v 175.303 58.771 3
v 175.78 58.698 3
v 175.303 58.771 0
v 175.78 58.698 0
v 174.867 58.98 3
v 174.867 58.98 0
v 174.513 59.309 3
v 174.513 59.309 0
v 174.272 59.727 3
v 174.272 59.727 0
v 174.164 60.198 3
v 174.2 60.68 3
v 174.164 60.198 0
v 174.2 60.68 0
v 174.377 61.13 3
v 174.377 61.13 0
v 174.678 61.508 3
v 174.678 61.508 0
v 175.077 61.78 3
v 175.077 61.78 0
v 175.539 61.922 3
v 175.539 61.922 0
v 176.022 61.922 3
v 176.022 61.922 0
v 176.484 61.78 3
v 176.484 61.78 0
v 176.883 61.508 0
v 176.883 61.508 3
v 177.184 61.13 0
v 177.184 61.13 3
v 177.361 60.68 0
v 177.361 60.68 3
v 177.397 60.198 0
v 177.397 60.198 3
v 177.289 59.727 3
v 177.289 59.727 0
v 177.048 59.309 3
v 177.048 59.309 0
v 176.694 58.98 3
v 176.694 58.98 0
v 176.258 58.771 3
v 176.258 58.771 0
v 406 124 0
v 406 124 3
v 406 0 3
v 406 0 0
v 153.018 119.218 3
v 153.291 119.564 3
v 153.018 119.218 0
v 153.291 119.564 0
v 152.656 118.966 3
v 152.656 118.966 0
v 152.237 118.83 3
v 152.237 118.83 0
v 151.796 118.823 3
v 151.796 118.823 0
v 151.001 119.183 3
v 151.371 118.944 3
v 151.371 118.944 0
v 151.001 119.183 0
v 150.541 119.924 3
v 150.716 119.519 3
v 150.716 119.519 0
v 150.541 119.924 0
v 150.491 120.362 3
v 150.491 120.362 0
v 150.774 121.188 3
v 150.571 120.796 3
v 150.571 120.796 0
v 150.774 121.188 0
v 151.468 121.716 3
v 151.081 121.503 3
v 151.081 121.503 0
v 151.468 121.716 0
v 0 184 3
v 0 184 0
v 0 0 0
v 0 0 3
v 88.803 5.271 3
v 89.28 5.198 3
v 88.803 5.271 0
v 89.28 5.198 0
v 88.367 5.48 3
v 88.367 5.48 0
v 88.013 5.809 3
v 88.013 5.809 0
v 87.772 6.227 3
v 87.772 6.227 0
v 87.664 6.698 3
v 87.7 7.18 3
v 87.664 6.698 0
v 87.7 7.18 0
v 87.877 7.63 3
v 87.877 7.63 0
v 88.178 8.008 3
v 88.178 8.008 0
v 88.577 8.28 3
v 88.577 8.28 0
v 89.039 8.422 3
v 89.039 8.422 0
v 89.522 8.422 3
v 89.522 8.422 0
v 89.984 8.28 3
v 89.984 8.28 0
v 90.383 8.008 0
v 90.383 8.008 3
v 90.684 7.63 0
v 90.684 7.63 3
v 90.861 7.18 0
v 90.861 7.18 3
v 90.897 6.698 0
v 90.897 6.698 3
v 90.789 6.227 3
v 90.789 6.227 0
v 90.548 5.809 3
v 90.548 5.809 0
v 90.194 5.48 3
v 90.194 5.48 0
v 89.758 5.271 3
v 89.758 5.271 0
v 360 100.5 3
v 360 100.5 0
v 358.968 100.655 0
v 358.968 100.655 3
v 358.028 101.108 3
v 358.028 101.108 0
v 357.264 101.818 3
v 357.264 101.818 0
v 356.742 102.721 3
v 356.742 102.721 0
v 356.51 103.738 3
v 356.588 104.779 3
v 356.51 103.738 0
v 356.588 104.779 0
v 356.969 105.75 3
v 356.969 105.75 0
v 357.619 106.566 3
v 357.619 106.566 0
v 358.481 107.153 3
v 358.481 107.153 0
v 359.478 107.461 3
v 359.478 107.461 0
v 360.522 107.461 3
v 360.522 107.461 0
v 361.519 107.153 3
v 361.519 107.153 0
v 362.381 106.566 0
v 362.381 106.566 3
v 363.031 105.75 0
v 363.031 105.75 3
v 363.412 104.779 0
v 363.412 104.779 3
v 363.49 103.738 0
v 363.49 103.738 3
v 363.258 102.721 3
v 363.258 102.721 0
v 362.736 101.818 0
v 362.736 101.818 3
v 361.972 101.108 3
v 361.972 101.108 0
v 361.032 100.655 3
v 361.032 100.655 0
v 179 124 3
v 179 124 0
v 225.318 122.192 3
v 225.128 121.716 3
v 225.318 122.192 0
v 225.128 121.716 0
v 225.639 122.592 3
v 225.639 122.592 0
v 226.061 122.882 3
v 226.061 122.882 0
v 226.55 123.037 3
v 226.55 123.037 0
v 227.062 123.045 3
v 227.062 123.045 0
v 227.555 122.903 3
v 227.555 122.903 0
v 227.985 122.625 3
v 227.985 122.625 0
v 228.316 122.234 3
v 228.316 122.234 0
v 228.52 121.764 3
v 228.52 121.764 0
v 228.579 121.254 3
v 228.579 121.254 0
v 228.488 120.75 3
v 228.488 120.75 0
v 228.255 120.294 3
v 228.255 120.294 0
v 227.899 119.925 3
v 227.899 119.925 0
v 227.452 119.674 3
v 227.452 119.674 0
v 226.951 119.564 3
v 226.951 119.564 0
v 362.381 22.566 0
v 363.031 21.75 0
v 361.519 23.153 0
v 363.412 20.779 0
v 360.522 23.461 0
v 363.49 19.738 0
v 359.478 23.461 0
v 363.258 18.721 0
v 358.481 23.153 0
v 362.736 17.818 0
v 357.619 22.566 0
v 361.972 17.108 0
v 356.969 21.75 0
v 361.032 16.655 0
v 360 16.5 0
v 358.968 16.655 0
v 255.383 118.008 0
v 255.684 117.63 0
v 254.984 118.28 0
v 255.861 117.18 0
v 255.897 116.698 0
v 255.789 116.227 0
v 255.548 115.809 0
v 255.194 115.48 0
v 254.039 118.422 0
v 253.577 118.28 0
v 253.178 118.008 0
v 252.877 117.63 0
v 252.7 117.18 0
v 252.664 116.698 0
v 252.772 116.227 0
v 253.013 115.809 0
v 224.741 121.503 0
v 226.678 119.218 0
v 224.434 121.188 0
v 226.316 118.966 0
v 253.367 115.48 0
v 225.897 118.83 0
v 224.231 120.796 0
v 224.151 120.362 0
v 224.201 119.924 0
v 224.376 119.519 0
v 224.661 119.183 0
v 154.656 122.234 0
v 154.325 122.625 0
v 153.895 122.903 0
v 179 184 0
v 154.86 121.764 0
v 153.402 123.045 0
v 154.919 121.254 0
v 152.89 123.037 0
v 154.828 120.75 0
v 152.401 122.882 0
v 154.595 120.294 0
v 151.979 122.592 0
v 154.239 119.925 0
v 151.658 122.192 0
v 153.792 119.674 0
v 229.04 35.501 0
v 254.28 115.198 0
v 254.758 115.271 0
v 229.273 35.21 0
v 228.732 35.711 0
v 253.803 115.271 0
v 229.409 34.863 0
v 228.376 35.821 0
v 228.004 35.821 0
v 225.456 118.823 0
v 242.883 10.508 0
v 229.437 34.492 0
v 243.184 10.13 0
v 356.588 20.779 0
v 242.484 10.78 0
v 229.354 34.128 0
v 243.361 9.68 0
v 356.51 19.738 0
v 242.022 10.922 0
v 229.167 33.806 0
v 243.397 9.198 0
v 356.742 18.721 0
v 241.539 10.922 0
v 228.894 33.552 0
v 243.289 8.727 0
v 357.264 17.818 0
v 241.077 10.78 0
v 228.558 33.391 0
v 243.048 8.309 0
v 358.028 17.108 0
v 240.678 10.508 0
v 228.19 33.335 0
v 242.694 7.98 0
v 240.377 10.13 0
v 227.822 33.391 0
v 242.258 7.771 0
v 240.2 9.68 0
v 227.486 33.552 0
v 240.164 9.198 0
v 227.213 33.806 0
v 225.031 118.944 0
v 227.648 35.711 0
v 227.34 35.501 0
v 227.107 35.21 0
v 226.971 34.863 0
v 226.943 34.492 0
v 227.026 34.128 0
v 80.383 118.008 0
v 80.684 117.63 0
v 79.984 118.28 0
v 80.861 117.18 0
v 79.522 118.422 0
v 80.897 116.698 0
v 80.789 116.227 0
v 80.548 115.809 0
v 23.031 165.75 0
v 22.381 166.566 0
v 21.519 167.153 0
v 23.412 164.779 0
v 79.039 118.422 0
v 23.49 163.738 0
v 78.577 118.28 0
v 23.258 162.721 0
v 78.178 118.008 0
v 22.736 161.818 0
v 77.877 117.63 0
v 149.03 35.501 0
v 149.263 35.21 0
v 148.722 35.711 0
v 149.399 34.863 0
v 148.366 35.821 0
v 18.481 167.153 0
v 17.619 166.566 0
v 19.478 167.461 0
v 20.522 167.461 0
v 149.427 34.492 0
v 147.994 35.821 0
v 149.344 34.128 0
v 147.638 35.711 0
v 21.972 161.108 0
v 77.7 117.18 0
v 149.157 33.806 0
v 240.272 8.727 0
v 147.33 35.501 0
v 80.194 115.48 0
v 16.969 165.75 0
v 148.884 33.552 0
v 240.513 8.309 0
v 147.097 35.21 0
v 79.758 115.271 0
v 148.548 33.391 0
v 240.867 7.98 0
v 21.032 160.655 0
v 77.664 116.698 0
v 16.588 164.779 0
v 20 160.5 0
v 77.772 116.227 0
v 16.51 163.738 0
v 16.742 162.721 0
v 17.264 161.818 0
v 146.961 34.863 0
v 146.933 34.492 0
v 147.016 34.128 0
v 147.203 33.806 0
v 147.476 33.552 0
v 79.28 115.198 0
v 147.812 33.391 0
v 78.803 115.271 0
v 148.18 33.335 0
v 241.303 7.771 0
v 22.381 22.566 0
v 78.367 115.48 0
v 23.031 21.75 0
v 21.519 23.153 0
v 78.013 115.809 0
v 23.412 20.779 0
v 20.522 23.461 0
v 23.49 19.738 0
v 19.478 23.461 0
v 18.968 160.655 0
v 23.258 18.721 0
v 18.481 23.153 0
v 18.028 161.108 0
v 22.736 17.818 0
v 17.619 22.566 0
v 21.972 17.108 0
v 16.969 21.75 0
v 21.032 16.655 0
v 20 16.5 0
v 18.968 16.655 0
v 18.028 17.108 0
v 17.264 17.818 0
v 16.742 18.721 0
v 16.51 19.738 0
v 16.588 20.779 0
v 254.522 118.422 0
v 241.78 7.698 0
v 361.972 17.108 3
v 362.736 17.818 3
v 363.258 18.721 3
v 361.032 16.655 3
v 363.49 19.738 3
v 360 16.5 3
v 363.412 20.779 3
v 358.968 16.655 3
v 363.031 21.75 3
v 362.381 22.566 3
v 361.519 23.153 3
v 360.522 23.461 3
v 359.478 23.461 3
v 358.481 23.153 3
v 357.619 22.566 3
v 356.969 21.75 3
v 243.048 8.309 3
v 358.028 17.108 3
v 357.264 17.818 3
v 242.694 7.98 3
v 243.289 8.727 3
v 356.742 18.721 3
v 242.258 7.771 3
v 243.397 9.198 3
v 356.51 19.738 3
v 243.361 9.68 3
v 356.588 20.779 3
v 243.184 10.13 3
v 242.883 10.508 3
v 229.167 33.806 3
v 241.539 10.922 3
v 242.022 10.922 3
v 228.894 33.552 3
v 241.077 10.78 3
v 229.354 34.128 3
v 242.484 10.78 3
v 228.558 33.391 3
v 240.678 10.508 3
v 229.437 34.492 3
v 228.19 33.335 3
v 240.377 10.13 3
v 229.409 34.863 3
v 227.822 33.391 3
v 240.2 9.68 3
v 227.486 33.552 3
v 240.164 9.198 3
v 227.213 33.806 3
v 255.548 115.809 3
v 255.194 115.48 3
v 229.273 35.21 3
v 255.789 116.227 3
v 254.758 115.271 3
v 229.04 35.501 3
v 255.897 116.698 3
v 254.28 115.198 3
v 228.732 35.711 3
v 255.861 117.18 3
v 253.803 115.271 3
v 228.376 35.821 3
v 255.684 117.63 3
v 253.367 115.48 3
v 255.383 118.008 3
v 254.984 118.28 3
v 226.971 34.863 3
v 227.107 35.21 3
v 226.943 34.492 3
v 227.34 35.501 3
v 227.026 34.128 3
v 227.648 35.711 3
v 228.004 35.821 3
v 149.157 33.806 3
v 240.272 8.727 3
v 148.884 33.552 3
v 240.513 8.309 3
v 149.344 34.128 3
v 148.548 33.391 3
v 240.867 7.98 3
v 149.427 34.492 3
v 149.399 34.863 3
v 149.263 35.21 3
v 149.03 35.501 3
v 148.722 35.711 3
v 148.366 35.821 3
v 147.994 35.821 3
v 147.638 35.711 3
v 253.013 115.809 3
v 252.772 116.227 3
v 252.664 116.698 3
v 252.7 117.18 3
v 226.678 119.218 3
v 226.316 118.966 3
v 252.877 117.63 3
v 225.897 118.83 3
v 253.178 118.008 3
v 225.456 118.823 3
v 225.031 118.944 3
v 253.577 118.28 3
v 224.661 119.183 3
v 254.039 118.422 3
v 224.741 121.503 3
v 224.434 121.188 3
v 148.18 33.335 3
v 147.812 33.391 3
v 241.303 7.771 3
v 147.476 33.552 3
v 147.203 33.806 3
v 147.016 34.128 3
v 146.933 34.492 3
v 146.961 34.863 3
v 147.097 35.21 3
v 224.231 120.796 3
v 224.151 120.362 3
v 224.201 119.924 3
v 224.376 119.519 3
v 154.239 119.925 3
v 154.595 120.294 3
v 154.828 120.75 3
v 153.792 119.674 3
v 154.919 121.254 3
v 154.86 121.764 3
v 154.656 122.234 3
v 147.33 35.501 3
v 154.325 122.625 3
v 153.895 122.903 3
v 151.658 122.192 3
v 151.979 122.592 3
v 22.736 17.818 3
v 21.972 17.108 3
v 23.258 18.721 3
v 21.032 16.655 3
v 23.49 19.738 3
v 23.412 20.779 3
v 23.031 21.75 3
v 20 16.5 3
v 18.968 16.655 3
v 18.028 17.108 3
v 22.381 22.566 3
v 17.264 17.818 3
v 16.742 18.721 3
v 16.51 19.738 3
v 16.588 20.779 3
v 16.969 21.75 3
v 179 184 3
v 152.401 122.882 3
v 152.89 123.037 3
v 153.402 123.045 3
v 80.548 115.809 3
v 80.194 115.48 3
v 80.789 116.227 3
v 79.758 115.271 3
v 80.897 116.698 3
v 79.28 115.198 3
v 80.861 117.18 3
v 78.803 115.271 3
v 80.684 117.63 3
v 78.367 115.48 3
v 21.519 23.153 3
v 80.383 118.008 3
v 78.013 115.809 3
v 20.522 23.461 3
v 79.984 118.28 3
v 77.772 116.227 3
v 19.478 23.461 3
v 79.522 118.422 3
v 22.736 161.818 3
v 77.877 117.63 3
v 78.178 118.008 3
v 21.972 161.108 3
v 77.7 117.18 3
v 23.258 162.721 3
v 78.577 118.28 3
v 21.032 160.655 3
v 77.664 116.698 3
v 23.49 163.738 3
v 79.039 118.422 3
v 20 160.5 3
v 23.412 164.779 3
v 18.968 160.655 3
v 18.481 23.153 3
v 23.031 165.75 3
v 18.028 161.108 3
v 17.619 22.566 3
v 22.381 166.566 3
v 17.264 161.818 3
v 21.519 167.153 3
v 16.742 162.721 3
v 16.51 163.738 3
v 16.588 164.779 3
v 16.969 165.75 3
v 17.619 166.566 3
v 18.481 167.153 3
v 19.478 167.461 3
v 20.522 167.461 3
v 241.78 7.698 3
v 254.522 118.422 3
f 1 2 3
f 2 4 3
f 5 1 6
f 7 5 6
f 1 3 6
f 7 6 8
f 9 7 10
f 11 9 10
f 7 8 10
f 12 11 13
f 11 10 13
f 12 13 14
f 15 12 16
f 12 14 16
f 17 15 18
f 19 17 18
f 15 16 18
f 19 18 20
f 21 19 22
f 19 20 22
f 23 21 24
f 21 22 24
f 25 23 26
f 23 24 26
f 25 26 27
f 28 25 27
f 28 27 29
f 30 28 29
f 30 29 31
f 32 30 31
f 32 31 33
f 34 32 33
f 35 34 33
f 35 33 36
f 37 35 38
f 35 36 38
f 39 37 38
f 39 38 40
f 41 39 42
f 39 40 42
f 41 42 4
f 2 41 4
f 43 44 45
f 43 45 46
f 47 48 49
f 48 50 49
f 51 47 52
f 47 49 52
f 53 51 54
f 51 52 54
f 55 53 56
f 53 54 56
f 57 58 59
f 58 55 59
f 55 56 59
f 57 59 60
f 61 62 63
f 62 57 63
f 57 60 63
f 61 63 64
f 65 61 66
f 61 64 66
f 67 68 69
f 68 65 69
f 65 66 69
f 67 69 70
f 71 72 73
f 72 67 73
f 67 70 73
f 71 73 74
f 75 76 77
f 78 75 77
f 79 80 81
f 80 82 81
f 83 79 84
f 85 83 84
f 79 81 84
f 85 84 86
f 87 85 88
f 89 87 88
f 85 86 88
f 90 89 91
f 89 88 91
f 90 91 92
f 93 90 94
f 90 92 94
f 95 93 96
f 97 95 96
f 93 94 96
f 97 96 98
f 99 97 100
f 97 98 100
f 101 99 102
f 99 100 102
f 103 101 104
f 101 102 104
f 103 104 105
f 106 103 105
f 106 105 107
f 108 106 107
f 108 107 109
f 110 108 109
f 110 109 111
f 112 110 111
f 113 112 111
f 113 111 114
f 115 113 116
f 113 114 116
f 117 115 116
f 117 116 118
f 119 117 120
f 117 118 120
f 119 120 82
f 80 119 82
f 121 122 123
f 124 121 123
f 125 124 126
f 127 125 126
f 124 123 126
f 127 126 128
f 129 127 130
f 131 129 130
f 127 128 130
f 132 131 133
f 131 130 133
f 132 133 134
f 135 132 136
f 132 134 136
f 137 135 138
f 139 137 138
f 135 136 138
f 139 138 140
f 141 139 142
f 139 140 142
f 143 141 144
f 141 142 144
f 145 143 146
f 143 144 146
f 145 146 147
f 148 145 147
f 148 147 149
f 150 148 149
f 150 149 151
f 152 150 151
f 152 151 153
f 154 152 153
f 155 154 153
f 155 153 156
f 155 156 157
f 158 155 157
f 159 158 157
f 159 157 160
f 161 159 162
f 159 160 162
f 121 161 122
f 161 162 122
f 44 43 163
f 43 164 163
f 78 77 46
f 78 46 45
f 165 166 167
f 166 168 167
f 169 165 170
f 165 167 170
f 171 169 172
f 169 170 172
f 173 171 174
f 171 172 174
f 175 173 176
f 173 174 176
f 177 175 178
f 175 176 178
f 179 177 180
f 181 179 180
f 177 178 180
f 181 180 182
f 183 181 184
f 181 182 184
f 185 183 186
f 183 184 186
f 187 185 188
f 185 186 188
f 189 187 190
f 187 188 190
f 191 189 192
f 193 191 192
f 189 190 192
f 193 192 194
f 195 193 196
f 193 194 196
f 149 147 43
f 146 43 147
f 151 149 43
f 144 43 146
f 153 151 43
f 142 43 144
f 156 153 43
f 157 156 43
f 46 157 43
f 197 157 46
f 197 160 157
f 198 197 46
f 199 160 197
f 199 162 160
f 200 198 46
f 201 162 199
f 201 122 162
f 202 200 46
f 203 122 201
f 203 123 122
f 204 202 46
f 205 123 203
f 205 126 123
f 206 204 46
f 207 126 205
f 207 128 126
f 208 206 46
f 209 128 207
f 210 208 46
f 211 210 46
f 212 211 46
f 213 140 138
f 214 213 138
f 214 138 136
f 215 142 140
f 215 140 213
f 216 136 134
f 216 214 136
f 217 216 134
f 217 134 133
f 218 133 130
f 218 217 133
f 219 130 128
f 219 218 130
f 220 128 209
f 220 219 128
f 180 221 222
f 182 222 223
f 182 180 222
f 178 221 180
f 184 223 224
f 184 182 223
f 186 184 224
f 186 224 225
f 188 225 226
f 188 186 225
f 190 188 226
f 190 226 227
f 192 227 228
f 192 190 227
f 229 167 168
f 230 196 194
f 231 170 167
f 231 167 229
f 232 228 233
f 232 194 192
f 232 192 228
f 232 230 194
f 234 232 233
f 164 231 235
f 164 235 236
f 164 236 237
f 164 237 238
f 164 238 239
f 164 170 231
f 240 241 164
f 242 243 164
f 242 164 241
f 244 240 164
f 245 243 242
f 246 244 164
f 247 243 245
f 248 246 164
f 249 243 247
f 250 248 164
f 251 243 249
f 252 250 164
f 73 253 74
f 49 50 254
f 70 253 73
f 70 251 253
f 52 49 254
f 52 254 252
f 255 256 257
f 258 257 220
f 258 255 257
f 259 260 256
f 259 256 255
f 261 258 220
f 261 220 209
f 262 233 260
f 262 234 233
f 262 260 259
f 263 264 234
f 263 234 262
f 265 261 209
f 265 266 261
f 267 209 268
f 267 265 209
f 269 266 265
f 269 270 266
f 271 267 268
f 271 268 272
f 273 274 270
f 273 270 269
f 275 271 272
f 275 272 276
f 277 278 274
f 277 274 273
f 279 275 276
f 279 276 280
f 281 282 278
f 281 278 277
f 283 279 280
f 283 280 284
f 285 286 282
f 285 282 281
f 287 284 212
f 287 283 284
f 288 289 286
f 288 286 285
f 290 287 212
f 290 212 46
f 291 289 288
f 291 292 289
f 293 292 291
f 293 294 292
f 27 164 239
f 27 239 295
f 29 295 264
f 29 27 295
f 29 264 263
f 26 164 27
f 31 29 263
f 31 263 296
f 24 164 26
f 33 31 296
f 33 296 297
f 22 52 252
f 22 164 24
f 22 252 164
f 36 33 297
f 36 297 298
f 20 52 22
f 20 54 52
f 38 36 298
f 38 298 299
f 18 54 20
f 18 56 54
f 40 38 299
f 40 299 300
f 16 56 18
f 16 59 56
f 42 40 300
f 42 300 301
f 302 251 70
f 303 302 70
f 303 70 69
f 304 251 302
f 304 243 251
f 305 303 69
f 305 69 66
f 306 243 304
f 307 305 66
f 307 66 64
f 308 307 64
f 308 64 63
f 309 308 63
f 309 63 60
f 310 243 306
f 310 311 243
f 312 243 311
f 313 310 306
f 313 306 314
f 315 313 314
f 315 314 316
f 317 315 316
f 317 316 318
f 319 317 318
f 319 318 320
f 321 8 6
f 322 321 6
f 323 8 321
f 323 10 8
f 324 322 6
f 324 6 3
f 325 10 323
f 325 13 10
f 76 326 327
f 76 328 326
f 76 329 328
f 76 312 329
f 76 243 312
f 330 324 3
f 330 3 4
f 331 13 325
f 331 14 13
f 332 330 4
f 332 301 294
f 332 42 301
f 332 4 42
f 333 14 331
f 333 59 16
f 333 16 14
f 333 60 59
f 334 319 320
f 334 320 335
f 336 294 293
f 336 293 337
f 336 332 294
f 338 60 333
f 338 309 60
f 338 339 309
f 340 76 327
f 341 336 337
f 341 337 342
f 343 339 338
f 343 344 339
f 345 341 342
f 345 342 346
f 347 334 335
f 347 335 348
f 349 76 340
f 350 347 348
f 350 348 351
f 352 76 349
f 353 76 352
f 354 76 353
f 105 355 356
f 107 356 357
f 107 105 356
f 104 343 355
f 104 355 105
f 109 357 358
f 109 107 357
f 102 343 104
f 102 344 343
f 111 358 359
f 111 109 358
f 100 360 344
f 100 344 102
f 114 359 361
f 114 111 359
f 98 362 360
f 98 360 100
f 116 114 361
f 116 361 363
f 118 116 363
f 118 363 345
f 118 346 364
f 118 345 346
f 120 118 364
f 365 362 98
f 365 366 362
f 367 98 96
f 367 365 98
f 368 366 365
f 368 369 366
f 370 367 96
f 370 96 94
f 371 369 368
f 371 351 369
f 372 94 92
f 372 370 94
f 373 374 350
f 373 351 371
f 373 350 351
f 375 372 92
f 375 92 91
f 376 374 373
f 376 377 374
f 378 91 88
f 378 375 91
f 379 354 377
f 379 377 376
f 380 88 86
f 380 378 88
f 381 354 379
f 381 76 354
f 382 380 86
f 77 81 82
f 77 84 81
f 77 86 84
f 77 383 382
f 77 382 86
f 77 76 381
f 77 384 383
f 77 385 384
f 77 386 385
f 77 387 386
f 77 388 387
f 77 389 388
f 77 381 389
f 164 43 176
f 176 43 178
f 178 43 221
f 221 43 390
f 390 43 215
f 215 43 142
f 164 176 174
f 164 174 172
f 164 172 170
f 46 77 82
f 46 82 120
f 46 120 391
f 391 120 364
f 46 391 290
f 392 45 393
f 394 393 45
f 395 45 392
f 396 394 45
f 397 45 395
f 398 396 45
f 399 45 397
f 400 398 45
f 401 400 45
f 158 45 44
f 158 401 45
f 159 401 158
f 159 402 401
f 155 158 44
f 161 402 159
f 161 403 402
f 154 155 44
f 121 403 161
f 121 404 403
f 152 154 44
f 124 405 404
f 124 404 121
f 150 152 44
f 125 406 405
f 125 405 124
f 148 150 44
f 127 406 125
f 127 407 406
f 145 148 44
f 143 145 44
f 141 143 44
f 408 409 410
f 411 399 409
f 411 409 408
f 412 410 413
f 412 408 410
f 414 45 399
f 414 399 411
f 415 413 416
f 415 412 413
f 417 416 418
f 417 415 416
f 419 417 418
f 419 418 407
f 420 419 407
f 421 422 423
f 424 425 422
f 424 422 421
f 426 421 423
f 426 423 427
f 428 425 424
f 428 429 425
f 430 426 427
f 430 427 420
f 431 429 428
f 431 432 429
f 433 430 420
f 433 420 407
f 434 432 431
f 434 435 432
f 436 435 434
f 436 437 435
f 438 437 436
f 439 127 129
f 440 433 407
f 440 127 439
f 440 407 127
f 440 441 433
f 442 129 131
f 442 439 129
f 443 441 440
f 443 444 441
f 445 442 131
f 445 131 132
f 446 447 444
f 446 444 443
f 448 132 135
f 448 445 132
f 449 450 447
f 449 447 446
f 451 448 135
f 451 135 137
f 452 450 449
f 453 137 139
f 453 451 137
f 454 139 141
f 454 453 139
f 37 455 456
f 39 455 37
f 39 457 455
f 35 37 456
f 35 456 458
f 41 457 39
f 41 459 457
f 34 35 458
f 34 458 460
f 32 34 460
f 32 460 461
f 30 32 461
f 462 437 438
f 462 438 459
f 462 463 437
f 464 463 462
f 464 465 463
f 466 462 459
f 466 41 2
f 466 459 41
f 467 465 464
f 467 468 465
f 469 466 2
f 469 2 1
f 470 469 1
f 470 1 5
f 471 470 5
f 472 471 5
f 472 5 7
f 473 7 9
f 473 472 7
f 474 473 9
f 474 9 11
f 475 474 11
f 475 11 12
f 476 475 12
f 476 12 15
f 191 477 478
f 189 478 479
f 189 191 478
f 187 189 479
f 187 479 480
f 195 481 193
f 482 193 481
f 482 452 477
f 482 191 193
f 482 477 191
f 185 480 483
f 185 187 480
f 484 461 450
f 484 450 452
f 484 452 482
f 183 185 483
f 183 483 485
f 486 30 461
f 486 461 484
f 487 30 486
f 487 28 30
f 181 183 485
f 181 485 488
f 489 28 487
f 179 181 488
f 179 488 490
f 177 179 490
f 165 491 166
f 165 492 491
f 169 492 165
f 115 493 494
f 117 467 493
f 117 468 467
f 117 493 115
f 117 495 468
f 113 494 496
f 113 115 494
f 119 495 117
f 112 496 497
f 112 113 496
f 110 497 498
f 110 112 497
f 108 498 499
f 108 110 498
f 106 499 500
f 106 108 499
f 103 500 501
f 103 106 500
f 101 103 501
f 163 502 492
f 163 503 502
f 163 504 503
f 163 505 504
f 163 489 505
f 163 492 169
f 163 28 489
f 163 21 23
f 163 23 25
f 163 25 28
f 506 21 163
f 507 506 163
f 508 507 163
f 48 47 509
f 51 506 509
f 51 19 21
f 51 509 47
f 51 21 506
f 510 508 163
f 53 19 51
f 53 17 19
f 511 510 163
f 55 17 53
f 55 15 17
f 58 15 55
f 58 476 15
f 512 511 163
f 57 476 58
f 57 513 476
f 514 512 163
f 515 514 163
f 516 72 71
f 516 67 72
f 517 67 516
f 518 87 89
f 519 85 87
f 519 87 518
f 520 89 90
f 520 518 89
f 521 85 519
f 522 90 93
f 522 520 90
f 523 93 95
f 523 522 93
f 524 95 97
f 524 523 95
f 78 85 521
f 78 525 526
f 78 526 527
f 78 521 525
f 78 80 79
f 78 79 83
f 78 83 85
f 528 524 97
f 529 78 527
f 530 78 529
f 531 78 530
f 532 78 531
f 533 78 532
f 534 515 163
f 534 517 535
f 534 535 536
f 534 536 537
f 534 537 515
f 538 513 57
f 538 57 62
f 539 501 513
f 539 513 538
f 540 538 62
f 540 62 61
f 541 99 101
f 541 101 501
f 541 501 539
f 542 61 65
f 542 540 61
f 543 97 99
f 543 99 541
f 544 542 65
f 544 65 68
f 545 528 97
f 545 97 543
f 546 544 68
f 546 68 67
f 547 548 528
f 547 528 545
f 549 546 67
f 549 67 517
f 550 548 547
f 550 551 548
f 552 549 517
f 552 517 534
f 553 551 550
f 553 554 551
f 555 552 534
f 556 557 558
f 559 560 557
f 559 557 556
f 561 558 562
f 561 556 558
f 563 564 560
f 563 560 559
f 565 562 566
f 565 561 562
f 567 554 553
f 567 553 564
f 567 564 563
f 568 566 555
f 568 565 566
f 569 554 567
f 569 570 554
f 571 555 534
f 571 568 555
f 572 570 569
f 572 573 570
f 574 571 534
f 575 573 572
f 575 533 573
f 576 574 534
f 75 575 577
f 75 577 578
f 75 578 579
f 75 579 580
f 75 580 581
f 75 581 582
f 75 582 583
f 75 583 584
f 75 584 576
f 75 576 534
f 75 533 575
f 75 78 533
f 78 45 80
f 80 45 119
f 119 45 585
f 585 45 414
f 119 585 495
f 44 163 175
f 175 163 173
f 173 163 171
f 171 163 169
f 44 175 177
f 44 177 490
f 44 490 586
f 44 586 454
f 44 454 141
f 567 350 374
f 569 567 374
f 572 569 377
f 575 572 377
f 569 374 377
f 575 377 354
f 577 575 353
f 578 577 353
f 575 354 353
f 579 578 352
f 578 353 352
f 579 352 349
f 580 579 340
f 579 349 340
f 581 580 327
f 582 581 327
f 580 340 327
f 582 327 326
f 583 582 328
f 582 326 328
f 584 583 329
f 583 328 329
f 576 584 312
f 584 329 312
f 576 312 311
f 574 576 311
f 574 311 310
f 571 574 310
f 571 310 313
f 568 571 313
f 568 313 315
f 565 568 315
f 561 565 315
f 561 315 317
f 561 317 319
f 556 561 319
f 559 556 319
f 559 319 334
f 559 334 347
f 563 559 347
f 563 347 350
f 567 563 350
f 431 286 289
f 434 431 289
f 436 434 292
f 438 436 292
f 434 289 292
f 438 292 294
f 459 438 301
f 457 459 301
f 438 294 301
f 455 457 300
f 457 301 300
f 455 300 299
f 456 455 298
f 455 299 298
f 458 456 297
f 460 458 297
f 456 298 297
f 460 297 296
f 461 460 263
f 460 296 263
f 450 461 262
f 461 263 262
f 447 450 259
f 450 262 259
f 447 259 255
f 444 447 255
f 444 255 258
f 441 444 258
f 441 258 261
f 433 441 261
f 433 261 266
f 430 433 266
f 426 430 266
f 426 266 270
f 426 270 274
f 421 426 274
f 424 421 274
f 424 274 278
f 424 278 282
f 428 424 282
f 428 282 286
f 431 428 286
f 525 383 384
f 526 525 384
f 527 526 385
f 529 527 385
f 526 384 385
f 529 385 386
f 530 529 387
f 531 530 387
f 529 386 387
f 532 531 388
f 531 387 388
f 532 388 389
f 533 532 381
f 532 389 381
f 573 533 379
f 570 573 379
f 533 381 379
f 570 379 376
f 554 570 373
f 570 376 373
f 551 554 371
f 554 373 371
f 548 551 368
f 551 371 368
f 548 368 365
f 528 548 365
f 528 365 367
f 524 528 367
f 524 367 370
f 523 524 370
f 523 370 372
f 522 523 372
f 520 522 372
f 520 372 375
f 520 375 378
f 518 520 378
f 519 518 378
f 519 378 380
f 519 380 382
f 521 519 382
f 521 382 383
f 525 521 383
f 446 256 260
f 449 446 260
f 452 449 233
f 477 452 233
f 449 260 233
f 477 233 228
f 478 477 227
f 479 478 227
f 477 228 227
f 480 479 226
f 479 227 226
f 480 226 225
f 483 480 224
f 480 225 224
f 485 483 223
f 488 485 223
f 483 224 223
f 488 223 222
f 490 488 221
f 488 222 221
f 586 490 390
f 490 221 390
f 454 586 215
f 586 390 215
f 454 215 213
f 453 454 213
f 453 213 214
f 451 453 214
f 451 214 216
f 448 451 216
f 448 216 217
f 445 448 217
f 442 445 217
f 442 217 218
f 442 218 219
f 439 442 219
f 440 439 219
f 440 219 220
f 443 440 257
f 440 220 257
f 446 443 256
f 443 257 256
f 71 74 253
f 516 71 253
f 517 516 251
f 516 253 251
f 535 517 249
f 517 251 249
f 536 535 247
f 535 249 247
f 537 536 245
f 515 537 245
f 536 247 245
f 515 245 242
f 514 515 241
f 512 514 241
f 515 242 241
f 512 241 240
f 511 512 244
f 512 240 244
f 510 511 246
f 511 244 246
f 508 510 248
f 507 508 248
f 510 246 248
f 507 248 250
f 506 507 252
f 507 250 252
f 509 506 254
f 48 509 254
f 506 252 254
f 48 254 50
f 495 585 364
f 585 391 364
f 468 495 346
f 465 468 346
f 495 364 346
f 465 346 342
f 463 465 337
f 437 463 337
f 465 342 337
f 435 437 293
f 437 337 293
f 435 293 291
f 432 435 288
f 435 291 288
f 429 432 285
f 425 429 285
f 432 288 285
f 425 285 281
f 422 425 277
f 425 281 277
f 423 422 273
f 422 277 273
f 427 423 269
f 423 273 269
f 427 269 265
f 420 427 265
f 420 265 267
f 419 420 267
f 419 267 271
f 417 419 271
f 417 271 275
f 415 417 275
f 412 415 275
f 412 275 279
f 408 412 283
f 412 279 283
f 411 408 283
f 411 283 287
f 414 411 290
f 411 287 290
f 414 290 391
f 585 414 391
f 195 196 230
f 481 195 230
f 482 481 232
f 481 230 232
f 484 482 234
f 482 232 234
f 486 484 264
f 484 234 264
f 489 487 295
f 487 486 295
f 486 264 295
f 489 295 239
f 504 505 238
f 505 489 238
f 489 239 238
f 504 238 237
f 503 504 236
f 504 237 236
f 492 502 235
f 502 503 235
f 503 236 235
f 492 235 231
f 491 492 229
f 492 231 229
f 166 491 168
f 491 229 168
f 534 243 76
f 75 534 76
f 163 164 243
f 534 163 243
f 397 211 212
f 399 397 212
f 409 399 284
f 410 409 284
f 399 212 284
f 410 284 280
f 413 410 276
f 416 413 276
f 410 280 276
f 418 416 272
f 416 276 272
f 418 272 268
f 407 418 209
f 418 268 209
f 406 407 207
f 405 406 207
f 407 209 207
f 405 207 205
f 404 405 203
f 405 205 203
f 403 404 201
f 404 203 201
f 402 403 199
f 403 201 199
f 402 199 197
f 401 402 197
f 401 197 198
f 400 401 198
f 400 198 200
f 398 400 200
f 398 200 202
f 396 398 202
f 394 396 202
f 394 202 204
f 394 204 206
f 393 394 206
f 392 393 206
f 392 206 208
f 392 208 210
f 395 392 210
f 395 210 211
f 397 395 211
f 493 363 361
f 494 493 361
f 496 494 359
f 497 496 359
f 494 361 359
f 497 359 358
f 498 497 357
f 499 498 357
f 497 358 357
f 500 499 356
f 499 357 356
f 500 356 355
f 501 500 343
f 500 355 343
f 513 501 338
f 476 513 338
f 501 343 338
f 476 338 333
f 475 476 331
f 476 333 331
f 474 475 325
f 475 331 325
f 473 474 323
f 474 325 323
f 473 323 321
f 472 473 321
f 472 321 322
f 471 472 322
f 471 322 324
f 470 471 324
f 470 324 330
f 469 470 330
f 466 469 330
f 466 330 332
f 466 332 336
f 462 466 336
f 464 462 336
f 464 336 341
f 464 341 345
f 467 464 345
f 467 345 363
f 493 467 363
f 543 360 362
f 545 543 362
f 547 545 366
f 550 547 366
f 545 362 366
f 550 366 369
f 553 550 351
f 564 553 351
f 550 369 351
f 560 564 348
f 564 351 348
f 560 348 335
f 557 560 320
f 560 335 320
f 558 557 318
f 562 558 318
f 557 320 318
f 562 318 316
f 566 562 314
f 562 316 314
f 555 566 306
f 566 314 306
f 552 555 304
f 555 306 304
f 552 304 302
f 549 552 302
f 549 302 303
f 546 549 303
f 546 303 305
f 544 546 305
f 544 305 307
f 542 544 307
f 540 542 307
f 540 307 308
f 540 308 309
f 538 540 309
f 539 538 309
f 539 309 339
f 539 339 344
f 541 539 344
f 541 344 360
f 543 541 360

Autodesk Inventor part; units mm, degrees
ref_plane "YZ Plane" through (0, 0, 0) normal (1, 0, 0) x (0, 1, 0)
ref_plane "XZ Plane" through (0, 0, 0) normal (0, 1, 0) x (-1, 0, 0)
ref_plane "XY Plane" through (0, 0, 0) normal (0, 0, 1) x (1, 0, 0)
sketch "Sketch1" plane through (0, 0, 0) normal (0, 0, 1) x (1, 0, 0)
  line L0 (0, 0) -> (380, 0)
  line L1 (380, 0) -> (380, 124)
  line L2 (380, 124) -> (179, 124)
  line L3 (179, 124) -> (179, 184)
  line L4 (179, 184) -> (0, 184)
  line L5 (0, 184) -> (0, 0)
  dimension "d0" = 380
  dimension "d1" = 124
  dimension "d2" = 201
  dimension "d3" = 60
extrude "Extrusion1" add sketch "Sketch1" along normal blind 3
sketch "Sketch2" plane through (0, 0, 3) normal (0, 0, 1) x (1, 0, 0)
  line L0 (0, 184) -> (0, 0) projected
  line L1 (179, 184) -> (0, 184) projected
  line L2 (0, 0) -> (380, 0) projected
  line L3 (380, 0) -> (380, 124) projected
  line L4 (380, 124) -> (179, 124) projected
  point P0 (20, 20)
  point P1 (20, 164)
  point P2 (360, 104)
  point P3 (360, 20)
  dimension "d6" = 20
  dimension "d7" = 20
  dimension "d8" = 20
  dimension "d9" = 20
  dimension "d10" = 20
  dimension "d11" = 20
  dimension "d12" = 20
  dimension "d13" = 20
hole "Hole1" at (20, 20, 3) at (20, 164, 3) at (360, 104, 3) at (360, 20, 3) direction (0, 0, -1) diameter 7 end through all
sketch "Sketch3" plane through (0, 0, 3) normal (0, 0, 1) x (1, 0, 0)
  line L0 (0, 0) -> (380, 0) projected
  line L1 (0, 184) -> (0, 0) projected
  point P0 (153.17, 121.31)
  point P1 (226.83, 121.31)
  dimension "d21" = 73.66
  dimension "d22" = 121.31
  dimension "d23" = 121.31
  dimension "d24" = 153.17
hole "Hole2" at (153.17, 121.31, 3) at (226.83, 121.31, 3) direction (0, 0, -1) diameter 3.5 end through all
sketch "Sketch4" plane through (380, 0, 0) normal (1, 0, 0) x (0, 0, -1)
  line L0 (0, 124) -> (-3, 124) projected
  line L1 (0, 0) -> (-3, 0)
  line L2 (-3, 0) -> (-3, 124)
  line L3 (-3, 124) -> (0, 124)
  line L4 (0, 124) -> (0, 0)
extrude "Extrusion2" add sketch "Sketch4" along normal blind 26
sketch "Sketch5" plane through (0, 0, 3) normal (0, 0, 1) x (1, 0, 0)
  circle A0 centre (241.7805, 9.3195) radius 2.5 projected
  circle A1 centre (175.7805, 60.3195) radius 2.5 projected
  circle A2 centre (254.2805, 116.8195) radius 2.5 projected
  circle A3 centre (79.2805, 116.8195) radius 2.5 projected
  circle A4 centre (89.2805, 6.8195) radius 2.5 projected
  line L0 (179, 124) -> (406, 124) projected
  line L1 (179, 184) -> (0, 184) projected
  line L2 (0, 184) -> (0, 0) projected
  dimension "d65" = 7.1805
  dimension "d66" = 7.1805
  dimension "d67" = 67.1805
  dimension "d68" = 114.6805
  dimension "d69" = 63.6805
  dimension "d70" = 117.1805
  dimension "d71" = 177.1805
  dimension "d72" = 79.2805
  dimension "d73" = 89.2805
  dimension "d74" = 175.7805
  dimension "d75" = 241.7805
  dimension "d76" = 254.2805
hole "Hole3" at (241.7805, 9.3195, 3) at (254.2805, 116.8195, 3) at (175.7805, 60.3195, 3) at (89.2805, 6.8195, 3) at (79.2805, 116.8195, 3) direction (0, 0, -1) diameter 3.242 depth 5 tip angle 118 thread size "M4x0.7" class "6H" standard "ISO Metric profile"
sketch "Sketch6" plane through (0, 0, 3) normal (0, 0, 1) x (1, 0, 0)
  circle A0 centre (225.65, 120.31) radius 1.75 projected
  circle A1 centre (151.99, 120.31) radius 1.75 projected
  point P0 (0, 0)
hole "Hole4" at (225.65, 120.31, 3) at (151.99, 120.31, 3) direction (0, 0, -1) diameter 3 depth 5 tip angle 118
sketch "Sketch7" plane through (0, 0, 3) normal (0, 0, 1) x (1, 0, 0)
  circle A0 centre (151.99, 120.31) radius 1.75 projected
  circle A1 centre (225.65, 120.31) radius 1.75 projected
  line L0 (179, 124) -> (406, 124) projected
  line L1 (0, 184) -> (0, 0) projected
  point P0 (228.19, 34.585)
  point P1 (148.18, 34.585)
  dimension "d48" = 85.725
  dimension "d49" = 85.725
  dimension "d50" = 80.01
  dimension "d51" = 2.54
  dimension "d52" = 3.69
  dimension "d53" = 89.415
  dimension "d54" = 151.99
  dimension "d55" = 148.18
  dimension "d56" = 73.66
  dimension "d57" = 228.19
hole "Hole5" at (228.19, 34.585, 3) at (148.18, 34.585, 3) direction (0, 0, -1) diameter 2.5 depth 5 tip angle 118
properties part number "SupportsheetEPS" material "Aluminum 6061"
